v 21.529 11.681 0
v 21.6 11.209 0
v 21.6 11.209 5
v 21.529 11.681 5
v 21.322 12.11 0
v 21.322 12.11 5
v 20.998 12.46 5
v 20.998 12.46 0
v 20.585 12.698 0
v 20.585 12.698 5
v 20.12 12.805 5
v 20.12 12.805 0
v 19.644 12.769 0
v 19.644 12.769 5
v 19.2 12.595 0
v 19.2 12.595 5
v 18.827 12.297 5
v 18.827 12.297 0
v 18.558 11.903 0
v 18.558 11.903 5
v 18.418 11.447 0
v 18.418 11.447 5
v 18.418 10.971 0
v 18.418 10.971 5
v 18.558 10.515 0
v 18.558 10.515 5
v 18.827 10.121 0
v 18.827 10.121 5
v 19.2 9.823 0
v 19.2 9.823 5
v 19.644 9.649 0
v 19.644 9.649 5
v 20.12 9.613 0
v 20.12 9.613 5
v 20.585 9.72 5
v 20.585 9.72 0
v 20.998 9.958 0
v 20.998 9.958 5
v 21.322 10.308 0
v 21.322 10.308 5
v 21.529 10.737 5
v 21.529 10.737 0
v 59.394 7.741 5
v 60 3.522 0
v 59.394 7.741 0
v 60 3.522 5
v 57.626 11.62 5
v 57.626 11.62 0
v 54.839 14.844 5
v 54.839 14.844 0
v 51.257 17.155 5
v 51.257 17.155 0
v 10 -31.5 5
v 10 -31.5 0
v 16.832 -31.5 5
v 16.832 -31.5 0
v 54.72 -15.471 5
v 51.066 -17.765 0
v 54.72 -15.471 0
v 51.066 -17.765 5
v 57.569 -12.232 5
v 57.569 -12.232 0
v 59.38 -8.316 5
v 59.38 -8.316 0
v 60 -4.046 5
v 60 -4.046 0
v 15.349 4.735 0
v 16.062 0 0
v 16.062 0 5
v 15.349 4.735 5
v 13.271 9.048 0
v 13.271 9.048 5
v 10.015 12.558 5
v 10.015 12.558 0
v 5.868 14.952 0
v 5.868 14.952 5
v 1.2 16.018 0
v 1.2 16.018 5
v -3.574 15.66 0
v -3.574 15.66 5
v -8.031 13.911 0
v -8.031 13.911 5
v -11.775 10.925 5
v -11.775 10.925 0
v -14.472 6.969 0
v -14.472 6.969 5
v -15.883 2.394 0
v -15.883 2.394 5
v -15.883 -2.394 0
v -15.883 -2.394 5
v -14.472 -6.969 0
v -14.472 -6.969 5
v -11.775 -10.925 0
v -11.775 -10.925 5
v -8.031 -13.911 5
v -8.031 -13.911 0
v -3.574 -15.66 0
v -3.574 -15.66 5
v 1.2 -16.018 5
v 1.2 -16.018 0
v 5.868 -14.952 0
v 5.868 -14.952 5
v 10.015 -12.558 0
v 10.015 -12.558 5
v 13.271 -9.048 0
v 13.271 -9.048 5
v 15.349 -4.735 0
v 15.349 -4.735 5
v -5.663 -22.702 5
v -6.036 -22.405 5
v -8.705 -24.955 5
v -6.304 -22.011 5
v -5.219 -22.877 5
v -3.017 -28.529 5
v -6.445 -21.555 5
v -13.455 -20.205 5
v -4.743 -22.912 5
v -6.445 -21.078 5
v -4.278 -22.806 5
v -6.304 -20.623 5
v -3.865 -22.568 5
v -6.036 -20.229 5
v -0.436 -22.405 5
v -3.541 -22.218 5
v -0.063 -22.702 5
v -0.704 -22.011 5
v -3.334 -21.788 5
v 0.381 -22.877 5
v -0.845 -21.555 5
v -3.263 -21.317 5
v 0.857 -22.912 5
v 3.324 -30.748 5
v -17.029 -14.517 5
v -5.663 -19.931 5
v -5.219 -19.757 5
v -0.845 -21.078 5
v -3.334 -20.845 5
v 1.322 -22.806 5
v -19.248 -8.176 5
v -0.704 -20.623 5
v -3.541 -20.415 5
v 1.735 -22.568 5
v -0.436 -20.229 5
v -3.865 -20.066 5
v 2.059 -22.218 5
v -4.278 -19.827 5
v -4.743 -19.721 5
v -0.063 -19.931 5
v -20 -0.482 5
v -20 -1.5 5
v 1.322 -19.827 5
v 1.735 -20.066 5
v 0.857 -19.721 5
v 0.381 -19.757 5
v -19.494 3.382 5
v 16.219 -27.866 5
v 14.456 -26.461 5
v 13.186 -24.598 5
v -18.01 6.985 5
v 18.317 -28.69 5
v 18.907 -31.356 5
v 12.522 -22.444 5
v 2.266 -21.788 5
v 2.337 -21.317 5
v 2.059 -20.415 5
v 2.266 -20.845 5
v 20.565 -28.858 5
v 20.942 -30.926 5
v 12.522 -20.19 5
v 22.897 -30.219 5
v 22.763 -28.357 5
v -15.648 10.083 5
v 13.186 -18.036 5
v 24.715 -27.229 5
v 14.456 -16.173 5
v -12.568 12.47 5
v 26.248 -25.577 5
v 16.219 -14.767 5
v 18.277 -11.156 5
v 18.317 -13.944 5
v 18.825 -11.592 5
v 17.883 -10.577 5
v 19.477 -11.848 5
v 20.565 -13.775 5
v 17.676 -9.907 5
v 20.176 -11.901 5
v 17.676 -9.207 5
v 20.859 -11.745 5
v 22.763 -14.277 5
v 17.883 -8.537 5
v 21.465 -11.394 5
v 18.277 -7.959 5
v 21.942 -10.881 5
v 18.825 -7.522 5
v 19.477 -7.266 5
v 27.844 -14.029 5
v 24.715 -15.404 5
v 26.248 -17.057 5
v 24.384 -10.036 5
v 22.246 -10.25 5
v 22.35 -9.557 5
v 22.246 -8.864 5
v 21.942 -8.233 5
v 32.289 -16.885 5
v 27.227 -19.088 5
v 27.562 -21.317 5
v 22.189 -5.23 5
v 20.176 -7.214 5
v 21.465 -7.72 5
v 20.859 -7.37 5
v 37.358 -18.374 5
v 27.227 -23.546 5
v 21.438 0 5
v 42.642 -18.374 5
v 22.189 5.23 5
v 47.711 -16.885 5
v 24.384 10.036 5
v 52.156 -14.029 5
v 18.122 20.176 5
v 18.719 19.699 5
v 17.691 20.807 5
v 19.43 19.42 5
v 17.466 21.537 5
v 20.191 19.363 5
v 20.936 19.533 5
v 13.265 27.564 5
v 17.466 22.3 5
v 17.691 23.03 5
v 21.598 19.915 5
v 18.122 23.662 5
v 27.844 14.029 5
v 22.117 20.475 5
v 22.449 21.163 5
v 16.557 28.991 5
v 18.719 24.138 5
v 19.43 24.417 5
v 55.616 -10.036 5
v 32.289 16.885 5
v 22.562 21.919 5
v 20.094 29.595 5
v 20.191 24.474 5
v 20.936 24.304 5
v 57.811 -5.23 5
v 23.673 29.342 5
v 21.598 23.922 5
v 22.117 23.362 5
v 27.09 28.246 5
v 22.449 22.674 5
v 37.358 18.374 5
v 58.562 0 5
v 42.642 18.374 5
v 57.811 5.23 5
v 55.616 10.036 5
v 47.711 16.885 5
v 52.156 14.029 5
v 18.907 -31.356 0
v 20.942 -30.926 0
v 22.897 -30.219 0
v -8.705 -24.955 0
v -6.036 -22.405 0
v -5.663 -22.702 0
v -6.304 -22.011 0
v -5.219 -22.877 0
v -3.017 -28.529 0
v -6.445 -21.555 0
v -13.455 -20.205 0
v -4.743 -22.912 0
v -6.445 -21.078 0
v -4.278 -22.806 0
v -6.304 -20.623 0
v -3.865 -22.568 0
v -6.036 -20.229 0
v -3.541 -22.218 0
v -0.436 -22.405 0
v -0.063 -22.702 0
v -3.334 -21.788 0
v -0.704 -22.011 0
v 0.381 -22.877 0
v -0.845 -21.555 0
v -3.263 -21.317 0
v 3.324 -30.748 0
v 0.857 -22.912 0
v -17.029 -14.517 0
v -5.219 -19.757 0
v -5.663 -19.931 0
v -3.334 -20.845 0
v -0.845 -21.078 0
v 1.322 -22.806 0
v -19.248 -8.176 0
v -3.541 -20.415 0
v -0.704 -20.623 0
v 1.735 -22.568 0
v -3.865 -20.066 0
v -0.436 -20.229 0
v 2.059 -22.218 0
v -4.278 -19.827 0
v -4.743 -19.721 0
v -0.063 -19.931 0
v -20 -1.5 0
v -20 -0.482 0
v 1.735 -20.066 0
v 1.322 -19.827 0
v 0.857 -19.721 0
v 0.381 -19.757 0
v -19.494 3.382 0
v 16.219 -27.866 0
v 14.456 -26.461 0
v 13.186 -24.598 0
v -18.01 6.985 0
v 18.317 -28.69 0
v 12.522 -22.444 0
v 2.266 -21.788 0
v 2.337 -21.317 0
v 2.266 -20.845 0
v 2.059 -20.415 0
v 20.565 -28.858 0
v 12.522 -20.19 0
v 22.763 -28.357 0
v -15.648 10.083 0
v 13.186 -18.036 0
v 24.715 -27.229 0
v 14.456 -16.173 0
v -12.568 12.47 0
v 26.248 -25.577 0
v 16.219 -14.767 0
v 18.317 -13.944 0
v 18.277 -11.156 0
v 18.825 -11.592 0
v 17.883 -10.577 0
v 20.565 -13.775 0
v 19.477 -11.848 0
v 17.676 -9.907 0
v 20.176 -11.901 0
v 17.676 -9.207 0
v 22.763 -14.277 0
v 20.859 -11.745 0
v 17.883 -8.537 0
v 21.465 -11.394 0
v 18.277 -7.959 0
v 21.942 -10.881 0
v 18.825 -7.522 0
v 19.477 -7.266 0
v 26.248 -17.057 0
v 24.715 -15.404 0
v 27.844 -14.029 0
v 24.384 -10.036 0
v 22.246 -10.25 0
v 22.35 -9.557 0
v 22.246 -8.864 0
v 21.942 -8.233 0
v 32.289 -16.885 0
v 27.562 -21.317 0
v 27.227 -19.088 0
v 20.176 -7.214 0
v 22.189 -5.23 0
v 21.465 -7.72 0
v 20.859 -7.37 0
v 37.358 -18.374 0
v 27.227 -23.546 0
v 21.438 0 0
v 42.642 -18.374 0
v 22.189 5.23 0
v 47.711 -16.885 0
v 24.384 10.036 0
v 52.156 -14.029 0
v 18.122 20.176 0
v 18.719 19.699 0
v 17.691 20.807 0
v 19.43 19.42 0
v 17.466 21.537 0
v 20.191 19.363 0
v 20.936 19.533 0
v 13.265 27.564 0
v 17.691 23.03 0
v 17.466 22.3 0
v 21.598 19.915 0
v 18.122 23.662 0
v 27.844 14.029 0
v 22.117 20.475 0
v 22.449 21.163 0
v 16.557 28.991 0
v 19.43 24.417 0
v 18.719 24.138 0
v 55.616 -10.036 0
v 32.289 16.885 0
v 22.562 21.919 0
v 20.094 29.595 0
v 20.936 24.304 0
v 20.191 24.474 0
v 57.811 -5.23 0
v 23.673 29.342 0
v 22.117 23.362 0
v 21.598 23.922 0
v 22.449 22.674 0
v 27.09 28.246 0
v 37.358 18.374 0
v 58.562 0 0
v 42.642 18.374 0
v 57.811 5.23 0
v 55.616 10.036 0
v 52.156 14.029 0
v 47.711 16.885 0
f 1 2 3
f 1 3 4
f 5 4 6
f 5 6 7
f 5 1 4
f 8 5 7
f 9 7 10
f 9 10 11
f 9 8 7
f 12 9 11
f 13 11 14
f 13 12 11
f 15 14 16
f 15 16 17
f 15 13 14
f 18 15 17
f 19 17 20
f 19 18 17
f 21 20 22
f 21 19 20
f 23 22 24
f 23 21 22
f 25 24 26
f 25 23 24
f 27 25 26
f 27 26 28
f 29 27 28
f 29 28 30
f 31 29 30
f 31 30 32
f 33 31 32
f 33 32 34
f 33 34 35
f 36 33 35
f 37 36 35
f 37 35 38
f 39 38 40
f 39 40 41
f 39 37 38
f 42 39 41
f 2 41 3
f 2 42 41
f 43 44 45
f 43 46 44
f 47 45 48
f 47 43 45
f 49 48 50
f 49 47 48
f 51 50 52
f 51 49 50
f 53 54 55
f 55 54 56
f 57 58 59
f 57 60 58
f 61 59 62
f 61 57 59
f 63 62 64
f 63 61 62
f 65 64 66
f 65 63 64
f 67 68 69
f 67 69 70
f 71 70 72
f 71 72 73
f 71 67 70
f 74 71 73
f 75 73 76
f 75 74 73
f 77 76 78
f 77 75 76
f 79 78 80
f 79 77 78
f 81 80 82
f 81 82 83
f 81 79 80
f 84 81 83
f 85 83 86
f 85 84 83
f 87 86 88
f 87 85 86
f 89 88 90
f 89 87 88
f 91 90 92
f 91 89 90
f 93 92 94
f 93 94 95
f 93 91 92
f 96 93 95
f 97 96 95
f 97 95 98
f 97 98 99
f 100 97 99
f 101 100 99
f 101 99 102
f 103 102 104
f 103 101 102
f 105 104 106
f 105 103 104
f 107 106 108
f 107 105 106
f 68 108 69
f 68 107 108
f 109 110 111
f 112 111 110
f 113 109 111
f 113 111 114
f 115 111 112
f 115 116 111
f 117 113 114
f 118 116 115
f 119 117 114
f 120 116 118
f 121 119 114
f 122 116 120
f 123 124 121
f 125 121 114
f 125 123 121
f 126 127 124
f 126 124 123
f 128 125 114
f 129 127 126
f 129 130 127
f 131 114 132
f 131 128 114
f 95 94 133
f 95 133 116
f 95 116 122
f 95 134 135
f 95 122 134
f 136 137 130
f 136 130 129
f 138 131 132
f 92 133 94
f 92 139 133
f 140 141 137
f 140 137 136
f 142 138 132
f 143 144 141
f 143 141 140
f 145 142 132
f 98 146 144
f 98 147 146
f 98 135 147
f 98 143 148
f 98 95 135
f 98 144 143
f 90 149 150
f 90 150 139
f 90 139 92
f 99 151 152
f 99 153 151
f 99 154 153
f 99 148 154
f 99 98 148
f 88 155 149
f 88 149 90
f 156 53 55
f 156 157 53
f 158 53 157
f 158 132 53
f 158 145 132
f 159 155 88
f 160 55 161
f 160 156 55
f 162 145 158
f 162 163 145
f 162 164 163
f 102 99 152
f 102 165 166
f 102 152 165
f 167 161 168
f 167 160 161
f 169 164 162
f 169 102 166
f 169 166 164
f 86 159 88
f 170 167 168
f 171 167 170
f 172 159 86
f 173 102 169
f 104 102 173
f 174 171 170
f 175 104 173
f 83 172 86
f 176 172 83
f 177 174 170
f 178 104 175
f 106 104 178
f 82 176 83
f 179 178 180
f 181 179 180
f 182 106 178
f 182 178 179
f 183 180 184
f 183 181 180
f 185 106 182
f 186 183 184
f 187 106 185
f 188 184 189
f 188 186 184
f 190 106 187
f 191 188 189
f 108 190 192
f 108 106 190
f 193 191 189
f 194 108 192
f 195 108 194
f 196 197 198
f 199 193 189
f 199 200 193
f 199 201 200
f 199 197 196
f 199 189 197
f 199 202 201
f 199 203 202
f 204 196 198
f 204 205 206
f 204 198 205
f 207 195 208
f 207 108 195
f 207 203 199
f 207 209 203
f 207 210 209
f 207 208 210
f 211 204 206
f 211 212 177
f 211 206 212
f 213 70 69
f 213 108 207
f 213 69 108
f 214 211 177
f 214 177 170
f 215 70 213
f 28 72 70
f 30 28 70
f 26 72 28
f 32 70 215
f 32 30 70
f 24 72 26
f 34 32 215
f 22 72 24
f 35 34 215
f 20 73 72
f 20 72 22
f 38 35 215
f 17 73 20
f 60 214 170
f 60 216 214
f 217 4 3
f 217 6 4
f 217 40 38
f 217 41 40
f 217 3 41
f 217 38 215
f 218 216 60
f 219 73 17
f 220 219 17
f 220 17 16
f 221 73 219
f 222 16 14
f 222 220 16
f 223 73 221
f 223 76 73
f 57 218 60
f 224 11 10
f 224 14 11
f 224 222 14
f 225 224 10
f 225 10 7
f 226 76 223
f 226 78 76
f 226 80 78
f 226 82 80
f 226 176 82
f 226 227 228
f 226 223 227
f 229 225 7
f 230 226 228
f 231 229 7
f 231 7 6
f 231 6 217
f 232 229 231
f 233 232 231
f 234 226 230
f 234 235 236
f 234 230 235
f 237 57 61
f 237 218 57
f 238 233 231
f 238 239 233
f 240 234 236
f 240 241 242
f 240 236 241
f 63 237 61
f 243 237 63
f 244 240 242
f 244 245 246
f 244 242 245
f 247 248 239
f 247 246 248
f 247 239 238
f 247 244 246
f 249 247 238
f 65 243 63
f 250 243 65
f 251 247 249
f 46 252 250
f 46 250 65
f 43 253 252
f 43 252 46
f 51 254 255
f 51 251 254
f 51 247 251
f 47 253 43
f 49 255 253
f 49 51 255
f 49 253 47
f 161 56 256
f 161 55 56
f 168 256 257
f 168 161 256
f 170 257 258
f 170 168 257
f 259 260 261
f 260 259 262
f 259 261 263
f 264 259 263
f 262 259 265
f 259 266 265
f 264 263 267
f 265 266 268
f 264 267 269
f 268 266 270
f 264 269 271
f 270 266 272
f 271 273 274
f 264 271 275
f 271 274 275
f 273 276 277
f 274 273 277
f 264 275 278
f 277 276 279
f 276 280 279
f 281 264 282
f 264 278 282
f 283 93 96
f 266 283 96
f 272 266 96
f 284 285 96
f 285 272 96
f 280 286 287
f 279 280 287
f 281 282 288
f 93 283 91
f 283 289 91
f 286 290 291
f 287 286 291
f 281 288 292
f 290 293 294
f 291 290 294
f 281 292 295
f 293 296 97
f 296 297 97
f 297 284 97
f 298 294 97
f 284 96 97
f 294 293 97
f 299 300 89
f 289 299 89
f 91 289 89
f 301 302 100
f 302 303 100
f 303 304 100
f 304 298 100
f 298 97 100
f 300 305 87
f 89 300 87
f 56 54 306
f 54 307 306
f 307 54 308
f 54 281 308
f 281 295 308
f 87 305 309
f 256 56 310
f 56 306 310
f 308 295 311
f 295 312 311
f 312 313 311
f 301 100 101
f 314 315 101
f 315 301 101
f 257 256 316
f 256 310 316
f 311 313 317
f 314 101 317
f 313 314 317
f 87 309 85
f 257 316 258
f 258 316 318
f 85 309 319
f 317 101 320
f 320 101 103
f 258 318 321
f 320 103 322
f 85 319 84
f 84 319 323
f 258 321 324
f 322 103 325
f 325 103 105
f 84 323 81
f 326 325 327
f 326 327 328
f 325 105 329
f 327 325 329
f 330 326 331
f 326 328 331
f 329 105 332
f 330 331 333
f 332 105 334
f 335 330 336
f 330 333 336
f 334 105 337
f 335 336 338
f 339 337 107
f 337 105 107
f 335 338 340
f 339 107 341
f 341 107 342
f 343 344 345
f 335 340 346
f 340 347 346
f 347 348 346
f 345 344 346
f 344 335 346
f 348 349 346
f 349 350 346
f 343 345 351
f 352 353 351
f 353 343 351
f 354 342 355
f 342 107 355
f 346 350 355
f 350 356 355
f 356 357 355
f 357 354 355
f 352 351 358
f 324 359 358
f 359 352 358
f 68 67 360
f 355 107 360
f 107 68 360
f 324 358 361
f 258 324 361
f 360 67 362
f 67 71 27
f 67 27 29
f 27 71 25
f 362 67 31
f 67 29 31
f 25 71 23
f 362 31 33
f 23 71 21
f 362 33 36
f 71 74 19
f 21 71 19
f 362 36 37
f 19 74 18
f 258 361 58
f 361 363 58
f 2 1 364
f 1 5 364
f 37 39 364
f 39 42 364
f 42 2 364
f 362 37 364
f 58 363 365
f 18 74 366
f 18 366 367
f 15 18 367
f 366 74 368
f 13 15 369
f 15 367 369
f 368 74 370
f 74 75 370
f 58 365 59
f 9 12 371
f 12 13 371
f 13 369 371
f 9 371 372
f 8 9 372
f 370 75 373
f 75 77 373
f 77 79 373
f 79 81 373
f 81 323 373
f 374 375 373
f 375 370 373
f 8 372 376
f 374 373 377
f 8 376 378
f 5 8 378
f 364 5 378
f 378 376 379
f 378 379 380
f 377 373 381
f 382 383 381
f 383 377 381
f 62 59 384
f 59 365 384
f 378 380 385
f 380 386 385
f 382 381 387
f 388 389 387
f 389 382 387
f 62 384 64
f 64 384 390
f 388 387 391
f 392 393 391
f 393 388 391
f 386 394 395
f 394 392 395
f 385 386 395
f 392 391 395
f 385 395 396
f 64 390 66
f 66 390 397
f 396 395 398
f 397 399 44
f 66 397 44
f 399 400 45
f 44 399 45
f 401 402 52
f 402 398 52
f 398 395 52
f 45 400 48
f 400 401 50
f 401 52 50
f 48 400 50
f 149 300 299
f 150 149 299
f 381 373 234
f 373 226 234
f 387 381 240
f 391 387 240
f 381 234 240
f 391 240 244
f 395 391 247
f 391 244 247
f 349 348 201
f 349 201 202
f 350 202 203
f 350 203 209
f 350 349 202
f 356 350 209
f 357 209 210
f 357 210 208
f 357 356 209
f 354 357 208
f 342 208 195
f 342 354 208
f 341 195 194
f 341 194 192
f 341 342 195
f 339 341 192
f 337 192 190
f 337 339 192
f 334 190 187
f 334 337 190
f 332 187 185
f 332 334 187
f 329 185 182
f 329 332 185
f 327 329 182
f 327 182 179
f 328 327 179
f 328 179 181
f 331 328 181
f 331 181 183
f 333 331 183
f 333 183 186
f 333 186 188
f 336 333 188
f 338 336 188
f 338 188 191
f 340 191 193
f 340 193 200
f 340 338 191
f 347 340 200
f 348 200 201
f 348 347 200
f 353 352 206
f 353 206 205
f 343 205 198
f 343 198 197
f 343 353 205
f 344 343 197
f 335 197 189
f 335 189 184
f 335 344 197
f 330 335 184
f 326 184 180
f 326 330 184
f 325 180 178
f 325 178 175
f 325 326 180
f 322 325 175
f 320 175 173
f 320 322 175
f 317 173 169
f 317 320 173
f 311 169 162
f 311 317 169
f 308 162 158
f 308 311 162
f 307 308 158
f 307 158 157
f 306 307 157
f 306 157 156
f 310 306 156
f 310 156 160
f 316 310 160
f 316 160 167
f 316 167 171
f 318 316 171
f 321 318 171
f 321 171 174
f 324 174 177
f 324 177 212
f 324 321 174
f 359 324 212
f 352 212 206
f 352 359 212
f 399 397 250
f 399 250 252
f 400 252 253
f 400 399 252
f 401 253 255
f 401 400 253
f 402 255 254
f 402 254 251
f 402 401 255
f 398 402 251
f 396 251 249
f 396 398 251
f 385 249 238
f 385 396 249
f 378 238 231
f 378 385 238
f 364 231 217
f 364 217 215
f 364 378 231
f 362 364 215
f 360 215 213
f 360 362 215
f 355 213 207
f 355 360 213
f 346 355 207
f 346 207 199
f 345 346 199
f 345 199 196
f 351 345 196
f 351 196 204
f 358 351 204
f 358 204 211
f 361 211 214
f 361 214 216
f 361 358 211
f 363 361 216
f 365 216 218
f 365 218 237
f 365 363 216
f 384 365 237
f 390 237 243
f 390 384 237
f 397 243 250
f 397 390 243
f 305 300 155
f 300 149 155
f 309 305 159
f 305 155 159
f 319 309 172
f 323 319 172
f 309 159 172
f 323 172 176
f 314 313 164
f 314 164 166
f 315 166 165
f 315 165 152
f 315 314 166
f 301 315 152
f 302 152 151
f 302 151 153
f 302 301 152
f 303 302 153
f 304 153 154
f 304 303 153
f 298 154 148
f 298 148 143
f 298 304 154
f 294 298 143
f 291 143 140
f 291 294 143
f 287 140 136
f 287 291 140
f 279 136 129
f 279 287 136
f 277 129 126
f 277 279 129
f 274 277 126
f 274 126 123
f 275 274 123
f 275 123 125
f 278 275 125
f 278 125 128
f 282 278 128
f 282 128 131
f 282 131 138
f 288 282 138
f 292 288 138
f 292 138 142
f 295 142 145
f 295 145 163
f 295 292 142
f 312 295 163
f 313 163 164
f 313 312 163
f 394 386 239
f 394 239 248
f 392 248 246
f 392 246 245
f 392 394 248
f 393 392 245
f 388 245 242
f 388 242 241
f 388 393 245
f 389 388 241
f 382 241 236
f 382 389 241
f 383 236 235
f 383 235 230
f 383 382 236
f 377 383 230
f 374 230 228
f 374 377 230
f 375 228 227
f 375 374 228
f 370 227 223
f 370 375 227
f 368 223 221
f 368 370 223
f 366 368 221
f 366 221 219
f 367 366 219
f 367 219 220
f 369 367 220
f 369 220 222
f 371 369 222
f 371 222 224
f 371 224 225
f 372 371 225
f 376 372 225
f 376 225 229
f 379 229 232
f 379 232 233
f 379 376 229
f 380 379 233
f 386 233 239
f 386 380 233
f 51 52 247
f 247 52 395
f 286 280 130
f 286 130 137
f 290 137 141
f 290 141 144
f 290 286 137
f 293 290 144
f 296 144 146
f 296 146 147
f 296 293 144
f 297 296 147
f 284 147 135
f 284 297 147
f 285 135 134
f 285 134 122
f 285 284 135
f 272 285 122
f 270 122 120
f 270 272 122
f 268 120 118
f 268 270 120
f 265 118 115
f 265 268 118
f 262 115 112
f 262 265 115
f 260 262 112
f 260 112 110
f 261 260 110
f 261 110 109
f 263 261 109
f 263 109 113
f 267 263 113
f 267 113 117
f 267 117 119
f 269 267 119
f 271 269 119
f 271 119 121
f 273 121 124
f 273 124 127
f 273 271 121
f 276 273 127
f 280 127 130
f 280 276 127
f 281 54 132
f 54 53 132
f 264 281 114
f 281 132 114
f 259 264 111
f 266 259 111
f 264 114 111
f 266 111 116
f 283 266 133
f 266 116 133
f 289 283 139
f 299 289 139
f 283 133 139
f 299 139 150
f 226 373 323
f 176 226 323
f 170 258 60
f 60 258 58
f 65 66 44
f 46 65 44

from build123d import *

# Parameters (mm, degrees)
SKETCH1_R           = 16.0625
SKETCH1_R_2         = 18.5625
SKETCH1_R_3         = 1.6
SKETCH1_R_4         = 2.35
SKETCH1_R_5         = 2.5625
SKETCH1_R_6         = 7.5625
BOSS_EXTRUDE1_DEPTH = 5
FILLET1_R           = 15
FILLET2_R           = 30


with BuildPart() as part:
    # Sketch1 → Boss-Extrude1 (new body)
    with BuildSketch(Plane.XY):
        Polygon((-20, -31.5), (20, -31.5), (60, -13.814957213), (60, 13.141793742), (20, 31.5), (-20, 8.126584262), align=None)
        Circle(SKETCH1_R, mode=Mode.SUBTRACT)
        with Locations((40, 0)):
            Circle(SKETCH1_R_2, mode=Mode.SUBTRACT)
        with Locations((20, 11.209005776)):
            Circle(SKETCH1_R_3, mode=Mode.SUBTRACT)
        with Locations((20, -9.557095977)):
            Circle(SKETCH1_R_4, mode=Mode.SUBTRACT)
        with Locations((20, 21.918567686)):
            Circle(SKETCH1_R_5, mode=Mode.SUBTRACT)
        with Locations((20, -21.316811866)):
            Circle(SKETCH1_R_6, mode=Mode.SUBTRACT)
        with Locations((0.737105173, -21.316811866)):
            Circle(SKETCH1_R_3, mode=Mode.SUBTRACT)
        with Locations((-4.862894827, -21.316811866)):
            Circle(SKETCH1_R_3, mode=Mode.SUBTRACT)
    extrude(amount=BOSS_EXTRUDE1_DEPTH)

    # Fillet1
    fillet1_edges = [part.edges().sort_by_distance(p)[0] for p in [
        (20, -31.5, 2.5),
        (-20, 8.126584262, 2.5),
        (20, 31.5, 2.5),
        (60, 13.141793742, 2.5),
        (60, -13.814957213, 2.5),
    ]]
    fillet(fillet1_edges, radius=FILLET1_R)

    # Fillet2
    fillet2_edges = [part.edges().sort_by_distance(p)[0] for p in [
        (-20, -31.5, 2.5),
    ]]
    fillet(fillet2_edges, radius=FILLET2_R)


solid = part.part
